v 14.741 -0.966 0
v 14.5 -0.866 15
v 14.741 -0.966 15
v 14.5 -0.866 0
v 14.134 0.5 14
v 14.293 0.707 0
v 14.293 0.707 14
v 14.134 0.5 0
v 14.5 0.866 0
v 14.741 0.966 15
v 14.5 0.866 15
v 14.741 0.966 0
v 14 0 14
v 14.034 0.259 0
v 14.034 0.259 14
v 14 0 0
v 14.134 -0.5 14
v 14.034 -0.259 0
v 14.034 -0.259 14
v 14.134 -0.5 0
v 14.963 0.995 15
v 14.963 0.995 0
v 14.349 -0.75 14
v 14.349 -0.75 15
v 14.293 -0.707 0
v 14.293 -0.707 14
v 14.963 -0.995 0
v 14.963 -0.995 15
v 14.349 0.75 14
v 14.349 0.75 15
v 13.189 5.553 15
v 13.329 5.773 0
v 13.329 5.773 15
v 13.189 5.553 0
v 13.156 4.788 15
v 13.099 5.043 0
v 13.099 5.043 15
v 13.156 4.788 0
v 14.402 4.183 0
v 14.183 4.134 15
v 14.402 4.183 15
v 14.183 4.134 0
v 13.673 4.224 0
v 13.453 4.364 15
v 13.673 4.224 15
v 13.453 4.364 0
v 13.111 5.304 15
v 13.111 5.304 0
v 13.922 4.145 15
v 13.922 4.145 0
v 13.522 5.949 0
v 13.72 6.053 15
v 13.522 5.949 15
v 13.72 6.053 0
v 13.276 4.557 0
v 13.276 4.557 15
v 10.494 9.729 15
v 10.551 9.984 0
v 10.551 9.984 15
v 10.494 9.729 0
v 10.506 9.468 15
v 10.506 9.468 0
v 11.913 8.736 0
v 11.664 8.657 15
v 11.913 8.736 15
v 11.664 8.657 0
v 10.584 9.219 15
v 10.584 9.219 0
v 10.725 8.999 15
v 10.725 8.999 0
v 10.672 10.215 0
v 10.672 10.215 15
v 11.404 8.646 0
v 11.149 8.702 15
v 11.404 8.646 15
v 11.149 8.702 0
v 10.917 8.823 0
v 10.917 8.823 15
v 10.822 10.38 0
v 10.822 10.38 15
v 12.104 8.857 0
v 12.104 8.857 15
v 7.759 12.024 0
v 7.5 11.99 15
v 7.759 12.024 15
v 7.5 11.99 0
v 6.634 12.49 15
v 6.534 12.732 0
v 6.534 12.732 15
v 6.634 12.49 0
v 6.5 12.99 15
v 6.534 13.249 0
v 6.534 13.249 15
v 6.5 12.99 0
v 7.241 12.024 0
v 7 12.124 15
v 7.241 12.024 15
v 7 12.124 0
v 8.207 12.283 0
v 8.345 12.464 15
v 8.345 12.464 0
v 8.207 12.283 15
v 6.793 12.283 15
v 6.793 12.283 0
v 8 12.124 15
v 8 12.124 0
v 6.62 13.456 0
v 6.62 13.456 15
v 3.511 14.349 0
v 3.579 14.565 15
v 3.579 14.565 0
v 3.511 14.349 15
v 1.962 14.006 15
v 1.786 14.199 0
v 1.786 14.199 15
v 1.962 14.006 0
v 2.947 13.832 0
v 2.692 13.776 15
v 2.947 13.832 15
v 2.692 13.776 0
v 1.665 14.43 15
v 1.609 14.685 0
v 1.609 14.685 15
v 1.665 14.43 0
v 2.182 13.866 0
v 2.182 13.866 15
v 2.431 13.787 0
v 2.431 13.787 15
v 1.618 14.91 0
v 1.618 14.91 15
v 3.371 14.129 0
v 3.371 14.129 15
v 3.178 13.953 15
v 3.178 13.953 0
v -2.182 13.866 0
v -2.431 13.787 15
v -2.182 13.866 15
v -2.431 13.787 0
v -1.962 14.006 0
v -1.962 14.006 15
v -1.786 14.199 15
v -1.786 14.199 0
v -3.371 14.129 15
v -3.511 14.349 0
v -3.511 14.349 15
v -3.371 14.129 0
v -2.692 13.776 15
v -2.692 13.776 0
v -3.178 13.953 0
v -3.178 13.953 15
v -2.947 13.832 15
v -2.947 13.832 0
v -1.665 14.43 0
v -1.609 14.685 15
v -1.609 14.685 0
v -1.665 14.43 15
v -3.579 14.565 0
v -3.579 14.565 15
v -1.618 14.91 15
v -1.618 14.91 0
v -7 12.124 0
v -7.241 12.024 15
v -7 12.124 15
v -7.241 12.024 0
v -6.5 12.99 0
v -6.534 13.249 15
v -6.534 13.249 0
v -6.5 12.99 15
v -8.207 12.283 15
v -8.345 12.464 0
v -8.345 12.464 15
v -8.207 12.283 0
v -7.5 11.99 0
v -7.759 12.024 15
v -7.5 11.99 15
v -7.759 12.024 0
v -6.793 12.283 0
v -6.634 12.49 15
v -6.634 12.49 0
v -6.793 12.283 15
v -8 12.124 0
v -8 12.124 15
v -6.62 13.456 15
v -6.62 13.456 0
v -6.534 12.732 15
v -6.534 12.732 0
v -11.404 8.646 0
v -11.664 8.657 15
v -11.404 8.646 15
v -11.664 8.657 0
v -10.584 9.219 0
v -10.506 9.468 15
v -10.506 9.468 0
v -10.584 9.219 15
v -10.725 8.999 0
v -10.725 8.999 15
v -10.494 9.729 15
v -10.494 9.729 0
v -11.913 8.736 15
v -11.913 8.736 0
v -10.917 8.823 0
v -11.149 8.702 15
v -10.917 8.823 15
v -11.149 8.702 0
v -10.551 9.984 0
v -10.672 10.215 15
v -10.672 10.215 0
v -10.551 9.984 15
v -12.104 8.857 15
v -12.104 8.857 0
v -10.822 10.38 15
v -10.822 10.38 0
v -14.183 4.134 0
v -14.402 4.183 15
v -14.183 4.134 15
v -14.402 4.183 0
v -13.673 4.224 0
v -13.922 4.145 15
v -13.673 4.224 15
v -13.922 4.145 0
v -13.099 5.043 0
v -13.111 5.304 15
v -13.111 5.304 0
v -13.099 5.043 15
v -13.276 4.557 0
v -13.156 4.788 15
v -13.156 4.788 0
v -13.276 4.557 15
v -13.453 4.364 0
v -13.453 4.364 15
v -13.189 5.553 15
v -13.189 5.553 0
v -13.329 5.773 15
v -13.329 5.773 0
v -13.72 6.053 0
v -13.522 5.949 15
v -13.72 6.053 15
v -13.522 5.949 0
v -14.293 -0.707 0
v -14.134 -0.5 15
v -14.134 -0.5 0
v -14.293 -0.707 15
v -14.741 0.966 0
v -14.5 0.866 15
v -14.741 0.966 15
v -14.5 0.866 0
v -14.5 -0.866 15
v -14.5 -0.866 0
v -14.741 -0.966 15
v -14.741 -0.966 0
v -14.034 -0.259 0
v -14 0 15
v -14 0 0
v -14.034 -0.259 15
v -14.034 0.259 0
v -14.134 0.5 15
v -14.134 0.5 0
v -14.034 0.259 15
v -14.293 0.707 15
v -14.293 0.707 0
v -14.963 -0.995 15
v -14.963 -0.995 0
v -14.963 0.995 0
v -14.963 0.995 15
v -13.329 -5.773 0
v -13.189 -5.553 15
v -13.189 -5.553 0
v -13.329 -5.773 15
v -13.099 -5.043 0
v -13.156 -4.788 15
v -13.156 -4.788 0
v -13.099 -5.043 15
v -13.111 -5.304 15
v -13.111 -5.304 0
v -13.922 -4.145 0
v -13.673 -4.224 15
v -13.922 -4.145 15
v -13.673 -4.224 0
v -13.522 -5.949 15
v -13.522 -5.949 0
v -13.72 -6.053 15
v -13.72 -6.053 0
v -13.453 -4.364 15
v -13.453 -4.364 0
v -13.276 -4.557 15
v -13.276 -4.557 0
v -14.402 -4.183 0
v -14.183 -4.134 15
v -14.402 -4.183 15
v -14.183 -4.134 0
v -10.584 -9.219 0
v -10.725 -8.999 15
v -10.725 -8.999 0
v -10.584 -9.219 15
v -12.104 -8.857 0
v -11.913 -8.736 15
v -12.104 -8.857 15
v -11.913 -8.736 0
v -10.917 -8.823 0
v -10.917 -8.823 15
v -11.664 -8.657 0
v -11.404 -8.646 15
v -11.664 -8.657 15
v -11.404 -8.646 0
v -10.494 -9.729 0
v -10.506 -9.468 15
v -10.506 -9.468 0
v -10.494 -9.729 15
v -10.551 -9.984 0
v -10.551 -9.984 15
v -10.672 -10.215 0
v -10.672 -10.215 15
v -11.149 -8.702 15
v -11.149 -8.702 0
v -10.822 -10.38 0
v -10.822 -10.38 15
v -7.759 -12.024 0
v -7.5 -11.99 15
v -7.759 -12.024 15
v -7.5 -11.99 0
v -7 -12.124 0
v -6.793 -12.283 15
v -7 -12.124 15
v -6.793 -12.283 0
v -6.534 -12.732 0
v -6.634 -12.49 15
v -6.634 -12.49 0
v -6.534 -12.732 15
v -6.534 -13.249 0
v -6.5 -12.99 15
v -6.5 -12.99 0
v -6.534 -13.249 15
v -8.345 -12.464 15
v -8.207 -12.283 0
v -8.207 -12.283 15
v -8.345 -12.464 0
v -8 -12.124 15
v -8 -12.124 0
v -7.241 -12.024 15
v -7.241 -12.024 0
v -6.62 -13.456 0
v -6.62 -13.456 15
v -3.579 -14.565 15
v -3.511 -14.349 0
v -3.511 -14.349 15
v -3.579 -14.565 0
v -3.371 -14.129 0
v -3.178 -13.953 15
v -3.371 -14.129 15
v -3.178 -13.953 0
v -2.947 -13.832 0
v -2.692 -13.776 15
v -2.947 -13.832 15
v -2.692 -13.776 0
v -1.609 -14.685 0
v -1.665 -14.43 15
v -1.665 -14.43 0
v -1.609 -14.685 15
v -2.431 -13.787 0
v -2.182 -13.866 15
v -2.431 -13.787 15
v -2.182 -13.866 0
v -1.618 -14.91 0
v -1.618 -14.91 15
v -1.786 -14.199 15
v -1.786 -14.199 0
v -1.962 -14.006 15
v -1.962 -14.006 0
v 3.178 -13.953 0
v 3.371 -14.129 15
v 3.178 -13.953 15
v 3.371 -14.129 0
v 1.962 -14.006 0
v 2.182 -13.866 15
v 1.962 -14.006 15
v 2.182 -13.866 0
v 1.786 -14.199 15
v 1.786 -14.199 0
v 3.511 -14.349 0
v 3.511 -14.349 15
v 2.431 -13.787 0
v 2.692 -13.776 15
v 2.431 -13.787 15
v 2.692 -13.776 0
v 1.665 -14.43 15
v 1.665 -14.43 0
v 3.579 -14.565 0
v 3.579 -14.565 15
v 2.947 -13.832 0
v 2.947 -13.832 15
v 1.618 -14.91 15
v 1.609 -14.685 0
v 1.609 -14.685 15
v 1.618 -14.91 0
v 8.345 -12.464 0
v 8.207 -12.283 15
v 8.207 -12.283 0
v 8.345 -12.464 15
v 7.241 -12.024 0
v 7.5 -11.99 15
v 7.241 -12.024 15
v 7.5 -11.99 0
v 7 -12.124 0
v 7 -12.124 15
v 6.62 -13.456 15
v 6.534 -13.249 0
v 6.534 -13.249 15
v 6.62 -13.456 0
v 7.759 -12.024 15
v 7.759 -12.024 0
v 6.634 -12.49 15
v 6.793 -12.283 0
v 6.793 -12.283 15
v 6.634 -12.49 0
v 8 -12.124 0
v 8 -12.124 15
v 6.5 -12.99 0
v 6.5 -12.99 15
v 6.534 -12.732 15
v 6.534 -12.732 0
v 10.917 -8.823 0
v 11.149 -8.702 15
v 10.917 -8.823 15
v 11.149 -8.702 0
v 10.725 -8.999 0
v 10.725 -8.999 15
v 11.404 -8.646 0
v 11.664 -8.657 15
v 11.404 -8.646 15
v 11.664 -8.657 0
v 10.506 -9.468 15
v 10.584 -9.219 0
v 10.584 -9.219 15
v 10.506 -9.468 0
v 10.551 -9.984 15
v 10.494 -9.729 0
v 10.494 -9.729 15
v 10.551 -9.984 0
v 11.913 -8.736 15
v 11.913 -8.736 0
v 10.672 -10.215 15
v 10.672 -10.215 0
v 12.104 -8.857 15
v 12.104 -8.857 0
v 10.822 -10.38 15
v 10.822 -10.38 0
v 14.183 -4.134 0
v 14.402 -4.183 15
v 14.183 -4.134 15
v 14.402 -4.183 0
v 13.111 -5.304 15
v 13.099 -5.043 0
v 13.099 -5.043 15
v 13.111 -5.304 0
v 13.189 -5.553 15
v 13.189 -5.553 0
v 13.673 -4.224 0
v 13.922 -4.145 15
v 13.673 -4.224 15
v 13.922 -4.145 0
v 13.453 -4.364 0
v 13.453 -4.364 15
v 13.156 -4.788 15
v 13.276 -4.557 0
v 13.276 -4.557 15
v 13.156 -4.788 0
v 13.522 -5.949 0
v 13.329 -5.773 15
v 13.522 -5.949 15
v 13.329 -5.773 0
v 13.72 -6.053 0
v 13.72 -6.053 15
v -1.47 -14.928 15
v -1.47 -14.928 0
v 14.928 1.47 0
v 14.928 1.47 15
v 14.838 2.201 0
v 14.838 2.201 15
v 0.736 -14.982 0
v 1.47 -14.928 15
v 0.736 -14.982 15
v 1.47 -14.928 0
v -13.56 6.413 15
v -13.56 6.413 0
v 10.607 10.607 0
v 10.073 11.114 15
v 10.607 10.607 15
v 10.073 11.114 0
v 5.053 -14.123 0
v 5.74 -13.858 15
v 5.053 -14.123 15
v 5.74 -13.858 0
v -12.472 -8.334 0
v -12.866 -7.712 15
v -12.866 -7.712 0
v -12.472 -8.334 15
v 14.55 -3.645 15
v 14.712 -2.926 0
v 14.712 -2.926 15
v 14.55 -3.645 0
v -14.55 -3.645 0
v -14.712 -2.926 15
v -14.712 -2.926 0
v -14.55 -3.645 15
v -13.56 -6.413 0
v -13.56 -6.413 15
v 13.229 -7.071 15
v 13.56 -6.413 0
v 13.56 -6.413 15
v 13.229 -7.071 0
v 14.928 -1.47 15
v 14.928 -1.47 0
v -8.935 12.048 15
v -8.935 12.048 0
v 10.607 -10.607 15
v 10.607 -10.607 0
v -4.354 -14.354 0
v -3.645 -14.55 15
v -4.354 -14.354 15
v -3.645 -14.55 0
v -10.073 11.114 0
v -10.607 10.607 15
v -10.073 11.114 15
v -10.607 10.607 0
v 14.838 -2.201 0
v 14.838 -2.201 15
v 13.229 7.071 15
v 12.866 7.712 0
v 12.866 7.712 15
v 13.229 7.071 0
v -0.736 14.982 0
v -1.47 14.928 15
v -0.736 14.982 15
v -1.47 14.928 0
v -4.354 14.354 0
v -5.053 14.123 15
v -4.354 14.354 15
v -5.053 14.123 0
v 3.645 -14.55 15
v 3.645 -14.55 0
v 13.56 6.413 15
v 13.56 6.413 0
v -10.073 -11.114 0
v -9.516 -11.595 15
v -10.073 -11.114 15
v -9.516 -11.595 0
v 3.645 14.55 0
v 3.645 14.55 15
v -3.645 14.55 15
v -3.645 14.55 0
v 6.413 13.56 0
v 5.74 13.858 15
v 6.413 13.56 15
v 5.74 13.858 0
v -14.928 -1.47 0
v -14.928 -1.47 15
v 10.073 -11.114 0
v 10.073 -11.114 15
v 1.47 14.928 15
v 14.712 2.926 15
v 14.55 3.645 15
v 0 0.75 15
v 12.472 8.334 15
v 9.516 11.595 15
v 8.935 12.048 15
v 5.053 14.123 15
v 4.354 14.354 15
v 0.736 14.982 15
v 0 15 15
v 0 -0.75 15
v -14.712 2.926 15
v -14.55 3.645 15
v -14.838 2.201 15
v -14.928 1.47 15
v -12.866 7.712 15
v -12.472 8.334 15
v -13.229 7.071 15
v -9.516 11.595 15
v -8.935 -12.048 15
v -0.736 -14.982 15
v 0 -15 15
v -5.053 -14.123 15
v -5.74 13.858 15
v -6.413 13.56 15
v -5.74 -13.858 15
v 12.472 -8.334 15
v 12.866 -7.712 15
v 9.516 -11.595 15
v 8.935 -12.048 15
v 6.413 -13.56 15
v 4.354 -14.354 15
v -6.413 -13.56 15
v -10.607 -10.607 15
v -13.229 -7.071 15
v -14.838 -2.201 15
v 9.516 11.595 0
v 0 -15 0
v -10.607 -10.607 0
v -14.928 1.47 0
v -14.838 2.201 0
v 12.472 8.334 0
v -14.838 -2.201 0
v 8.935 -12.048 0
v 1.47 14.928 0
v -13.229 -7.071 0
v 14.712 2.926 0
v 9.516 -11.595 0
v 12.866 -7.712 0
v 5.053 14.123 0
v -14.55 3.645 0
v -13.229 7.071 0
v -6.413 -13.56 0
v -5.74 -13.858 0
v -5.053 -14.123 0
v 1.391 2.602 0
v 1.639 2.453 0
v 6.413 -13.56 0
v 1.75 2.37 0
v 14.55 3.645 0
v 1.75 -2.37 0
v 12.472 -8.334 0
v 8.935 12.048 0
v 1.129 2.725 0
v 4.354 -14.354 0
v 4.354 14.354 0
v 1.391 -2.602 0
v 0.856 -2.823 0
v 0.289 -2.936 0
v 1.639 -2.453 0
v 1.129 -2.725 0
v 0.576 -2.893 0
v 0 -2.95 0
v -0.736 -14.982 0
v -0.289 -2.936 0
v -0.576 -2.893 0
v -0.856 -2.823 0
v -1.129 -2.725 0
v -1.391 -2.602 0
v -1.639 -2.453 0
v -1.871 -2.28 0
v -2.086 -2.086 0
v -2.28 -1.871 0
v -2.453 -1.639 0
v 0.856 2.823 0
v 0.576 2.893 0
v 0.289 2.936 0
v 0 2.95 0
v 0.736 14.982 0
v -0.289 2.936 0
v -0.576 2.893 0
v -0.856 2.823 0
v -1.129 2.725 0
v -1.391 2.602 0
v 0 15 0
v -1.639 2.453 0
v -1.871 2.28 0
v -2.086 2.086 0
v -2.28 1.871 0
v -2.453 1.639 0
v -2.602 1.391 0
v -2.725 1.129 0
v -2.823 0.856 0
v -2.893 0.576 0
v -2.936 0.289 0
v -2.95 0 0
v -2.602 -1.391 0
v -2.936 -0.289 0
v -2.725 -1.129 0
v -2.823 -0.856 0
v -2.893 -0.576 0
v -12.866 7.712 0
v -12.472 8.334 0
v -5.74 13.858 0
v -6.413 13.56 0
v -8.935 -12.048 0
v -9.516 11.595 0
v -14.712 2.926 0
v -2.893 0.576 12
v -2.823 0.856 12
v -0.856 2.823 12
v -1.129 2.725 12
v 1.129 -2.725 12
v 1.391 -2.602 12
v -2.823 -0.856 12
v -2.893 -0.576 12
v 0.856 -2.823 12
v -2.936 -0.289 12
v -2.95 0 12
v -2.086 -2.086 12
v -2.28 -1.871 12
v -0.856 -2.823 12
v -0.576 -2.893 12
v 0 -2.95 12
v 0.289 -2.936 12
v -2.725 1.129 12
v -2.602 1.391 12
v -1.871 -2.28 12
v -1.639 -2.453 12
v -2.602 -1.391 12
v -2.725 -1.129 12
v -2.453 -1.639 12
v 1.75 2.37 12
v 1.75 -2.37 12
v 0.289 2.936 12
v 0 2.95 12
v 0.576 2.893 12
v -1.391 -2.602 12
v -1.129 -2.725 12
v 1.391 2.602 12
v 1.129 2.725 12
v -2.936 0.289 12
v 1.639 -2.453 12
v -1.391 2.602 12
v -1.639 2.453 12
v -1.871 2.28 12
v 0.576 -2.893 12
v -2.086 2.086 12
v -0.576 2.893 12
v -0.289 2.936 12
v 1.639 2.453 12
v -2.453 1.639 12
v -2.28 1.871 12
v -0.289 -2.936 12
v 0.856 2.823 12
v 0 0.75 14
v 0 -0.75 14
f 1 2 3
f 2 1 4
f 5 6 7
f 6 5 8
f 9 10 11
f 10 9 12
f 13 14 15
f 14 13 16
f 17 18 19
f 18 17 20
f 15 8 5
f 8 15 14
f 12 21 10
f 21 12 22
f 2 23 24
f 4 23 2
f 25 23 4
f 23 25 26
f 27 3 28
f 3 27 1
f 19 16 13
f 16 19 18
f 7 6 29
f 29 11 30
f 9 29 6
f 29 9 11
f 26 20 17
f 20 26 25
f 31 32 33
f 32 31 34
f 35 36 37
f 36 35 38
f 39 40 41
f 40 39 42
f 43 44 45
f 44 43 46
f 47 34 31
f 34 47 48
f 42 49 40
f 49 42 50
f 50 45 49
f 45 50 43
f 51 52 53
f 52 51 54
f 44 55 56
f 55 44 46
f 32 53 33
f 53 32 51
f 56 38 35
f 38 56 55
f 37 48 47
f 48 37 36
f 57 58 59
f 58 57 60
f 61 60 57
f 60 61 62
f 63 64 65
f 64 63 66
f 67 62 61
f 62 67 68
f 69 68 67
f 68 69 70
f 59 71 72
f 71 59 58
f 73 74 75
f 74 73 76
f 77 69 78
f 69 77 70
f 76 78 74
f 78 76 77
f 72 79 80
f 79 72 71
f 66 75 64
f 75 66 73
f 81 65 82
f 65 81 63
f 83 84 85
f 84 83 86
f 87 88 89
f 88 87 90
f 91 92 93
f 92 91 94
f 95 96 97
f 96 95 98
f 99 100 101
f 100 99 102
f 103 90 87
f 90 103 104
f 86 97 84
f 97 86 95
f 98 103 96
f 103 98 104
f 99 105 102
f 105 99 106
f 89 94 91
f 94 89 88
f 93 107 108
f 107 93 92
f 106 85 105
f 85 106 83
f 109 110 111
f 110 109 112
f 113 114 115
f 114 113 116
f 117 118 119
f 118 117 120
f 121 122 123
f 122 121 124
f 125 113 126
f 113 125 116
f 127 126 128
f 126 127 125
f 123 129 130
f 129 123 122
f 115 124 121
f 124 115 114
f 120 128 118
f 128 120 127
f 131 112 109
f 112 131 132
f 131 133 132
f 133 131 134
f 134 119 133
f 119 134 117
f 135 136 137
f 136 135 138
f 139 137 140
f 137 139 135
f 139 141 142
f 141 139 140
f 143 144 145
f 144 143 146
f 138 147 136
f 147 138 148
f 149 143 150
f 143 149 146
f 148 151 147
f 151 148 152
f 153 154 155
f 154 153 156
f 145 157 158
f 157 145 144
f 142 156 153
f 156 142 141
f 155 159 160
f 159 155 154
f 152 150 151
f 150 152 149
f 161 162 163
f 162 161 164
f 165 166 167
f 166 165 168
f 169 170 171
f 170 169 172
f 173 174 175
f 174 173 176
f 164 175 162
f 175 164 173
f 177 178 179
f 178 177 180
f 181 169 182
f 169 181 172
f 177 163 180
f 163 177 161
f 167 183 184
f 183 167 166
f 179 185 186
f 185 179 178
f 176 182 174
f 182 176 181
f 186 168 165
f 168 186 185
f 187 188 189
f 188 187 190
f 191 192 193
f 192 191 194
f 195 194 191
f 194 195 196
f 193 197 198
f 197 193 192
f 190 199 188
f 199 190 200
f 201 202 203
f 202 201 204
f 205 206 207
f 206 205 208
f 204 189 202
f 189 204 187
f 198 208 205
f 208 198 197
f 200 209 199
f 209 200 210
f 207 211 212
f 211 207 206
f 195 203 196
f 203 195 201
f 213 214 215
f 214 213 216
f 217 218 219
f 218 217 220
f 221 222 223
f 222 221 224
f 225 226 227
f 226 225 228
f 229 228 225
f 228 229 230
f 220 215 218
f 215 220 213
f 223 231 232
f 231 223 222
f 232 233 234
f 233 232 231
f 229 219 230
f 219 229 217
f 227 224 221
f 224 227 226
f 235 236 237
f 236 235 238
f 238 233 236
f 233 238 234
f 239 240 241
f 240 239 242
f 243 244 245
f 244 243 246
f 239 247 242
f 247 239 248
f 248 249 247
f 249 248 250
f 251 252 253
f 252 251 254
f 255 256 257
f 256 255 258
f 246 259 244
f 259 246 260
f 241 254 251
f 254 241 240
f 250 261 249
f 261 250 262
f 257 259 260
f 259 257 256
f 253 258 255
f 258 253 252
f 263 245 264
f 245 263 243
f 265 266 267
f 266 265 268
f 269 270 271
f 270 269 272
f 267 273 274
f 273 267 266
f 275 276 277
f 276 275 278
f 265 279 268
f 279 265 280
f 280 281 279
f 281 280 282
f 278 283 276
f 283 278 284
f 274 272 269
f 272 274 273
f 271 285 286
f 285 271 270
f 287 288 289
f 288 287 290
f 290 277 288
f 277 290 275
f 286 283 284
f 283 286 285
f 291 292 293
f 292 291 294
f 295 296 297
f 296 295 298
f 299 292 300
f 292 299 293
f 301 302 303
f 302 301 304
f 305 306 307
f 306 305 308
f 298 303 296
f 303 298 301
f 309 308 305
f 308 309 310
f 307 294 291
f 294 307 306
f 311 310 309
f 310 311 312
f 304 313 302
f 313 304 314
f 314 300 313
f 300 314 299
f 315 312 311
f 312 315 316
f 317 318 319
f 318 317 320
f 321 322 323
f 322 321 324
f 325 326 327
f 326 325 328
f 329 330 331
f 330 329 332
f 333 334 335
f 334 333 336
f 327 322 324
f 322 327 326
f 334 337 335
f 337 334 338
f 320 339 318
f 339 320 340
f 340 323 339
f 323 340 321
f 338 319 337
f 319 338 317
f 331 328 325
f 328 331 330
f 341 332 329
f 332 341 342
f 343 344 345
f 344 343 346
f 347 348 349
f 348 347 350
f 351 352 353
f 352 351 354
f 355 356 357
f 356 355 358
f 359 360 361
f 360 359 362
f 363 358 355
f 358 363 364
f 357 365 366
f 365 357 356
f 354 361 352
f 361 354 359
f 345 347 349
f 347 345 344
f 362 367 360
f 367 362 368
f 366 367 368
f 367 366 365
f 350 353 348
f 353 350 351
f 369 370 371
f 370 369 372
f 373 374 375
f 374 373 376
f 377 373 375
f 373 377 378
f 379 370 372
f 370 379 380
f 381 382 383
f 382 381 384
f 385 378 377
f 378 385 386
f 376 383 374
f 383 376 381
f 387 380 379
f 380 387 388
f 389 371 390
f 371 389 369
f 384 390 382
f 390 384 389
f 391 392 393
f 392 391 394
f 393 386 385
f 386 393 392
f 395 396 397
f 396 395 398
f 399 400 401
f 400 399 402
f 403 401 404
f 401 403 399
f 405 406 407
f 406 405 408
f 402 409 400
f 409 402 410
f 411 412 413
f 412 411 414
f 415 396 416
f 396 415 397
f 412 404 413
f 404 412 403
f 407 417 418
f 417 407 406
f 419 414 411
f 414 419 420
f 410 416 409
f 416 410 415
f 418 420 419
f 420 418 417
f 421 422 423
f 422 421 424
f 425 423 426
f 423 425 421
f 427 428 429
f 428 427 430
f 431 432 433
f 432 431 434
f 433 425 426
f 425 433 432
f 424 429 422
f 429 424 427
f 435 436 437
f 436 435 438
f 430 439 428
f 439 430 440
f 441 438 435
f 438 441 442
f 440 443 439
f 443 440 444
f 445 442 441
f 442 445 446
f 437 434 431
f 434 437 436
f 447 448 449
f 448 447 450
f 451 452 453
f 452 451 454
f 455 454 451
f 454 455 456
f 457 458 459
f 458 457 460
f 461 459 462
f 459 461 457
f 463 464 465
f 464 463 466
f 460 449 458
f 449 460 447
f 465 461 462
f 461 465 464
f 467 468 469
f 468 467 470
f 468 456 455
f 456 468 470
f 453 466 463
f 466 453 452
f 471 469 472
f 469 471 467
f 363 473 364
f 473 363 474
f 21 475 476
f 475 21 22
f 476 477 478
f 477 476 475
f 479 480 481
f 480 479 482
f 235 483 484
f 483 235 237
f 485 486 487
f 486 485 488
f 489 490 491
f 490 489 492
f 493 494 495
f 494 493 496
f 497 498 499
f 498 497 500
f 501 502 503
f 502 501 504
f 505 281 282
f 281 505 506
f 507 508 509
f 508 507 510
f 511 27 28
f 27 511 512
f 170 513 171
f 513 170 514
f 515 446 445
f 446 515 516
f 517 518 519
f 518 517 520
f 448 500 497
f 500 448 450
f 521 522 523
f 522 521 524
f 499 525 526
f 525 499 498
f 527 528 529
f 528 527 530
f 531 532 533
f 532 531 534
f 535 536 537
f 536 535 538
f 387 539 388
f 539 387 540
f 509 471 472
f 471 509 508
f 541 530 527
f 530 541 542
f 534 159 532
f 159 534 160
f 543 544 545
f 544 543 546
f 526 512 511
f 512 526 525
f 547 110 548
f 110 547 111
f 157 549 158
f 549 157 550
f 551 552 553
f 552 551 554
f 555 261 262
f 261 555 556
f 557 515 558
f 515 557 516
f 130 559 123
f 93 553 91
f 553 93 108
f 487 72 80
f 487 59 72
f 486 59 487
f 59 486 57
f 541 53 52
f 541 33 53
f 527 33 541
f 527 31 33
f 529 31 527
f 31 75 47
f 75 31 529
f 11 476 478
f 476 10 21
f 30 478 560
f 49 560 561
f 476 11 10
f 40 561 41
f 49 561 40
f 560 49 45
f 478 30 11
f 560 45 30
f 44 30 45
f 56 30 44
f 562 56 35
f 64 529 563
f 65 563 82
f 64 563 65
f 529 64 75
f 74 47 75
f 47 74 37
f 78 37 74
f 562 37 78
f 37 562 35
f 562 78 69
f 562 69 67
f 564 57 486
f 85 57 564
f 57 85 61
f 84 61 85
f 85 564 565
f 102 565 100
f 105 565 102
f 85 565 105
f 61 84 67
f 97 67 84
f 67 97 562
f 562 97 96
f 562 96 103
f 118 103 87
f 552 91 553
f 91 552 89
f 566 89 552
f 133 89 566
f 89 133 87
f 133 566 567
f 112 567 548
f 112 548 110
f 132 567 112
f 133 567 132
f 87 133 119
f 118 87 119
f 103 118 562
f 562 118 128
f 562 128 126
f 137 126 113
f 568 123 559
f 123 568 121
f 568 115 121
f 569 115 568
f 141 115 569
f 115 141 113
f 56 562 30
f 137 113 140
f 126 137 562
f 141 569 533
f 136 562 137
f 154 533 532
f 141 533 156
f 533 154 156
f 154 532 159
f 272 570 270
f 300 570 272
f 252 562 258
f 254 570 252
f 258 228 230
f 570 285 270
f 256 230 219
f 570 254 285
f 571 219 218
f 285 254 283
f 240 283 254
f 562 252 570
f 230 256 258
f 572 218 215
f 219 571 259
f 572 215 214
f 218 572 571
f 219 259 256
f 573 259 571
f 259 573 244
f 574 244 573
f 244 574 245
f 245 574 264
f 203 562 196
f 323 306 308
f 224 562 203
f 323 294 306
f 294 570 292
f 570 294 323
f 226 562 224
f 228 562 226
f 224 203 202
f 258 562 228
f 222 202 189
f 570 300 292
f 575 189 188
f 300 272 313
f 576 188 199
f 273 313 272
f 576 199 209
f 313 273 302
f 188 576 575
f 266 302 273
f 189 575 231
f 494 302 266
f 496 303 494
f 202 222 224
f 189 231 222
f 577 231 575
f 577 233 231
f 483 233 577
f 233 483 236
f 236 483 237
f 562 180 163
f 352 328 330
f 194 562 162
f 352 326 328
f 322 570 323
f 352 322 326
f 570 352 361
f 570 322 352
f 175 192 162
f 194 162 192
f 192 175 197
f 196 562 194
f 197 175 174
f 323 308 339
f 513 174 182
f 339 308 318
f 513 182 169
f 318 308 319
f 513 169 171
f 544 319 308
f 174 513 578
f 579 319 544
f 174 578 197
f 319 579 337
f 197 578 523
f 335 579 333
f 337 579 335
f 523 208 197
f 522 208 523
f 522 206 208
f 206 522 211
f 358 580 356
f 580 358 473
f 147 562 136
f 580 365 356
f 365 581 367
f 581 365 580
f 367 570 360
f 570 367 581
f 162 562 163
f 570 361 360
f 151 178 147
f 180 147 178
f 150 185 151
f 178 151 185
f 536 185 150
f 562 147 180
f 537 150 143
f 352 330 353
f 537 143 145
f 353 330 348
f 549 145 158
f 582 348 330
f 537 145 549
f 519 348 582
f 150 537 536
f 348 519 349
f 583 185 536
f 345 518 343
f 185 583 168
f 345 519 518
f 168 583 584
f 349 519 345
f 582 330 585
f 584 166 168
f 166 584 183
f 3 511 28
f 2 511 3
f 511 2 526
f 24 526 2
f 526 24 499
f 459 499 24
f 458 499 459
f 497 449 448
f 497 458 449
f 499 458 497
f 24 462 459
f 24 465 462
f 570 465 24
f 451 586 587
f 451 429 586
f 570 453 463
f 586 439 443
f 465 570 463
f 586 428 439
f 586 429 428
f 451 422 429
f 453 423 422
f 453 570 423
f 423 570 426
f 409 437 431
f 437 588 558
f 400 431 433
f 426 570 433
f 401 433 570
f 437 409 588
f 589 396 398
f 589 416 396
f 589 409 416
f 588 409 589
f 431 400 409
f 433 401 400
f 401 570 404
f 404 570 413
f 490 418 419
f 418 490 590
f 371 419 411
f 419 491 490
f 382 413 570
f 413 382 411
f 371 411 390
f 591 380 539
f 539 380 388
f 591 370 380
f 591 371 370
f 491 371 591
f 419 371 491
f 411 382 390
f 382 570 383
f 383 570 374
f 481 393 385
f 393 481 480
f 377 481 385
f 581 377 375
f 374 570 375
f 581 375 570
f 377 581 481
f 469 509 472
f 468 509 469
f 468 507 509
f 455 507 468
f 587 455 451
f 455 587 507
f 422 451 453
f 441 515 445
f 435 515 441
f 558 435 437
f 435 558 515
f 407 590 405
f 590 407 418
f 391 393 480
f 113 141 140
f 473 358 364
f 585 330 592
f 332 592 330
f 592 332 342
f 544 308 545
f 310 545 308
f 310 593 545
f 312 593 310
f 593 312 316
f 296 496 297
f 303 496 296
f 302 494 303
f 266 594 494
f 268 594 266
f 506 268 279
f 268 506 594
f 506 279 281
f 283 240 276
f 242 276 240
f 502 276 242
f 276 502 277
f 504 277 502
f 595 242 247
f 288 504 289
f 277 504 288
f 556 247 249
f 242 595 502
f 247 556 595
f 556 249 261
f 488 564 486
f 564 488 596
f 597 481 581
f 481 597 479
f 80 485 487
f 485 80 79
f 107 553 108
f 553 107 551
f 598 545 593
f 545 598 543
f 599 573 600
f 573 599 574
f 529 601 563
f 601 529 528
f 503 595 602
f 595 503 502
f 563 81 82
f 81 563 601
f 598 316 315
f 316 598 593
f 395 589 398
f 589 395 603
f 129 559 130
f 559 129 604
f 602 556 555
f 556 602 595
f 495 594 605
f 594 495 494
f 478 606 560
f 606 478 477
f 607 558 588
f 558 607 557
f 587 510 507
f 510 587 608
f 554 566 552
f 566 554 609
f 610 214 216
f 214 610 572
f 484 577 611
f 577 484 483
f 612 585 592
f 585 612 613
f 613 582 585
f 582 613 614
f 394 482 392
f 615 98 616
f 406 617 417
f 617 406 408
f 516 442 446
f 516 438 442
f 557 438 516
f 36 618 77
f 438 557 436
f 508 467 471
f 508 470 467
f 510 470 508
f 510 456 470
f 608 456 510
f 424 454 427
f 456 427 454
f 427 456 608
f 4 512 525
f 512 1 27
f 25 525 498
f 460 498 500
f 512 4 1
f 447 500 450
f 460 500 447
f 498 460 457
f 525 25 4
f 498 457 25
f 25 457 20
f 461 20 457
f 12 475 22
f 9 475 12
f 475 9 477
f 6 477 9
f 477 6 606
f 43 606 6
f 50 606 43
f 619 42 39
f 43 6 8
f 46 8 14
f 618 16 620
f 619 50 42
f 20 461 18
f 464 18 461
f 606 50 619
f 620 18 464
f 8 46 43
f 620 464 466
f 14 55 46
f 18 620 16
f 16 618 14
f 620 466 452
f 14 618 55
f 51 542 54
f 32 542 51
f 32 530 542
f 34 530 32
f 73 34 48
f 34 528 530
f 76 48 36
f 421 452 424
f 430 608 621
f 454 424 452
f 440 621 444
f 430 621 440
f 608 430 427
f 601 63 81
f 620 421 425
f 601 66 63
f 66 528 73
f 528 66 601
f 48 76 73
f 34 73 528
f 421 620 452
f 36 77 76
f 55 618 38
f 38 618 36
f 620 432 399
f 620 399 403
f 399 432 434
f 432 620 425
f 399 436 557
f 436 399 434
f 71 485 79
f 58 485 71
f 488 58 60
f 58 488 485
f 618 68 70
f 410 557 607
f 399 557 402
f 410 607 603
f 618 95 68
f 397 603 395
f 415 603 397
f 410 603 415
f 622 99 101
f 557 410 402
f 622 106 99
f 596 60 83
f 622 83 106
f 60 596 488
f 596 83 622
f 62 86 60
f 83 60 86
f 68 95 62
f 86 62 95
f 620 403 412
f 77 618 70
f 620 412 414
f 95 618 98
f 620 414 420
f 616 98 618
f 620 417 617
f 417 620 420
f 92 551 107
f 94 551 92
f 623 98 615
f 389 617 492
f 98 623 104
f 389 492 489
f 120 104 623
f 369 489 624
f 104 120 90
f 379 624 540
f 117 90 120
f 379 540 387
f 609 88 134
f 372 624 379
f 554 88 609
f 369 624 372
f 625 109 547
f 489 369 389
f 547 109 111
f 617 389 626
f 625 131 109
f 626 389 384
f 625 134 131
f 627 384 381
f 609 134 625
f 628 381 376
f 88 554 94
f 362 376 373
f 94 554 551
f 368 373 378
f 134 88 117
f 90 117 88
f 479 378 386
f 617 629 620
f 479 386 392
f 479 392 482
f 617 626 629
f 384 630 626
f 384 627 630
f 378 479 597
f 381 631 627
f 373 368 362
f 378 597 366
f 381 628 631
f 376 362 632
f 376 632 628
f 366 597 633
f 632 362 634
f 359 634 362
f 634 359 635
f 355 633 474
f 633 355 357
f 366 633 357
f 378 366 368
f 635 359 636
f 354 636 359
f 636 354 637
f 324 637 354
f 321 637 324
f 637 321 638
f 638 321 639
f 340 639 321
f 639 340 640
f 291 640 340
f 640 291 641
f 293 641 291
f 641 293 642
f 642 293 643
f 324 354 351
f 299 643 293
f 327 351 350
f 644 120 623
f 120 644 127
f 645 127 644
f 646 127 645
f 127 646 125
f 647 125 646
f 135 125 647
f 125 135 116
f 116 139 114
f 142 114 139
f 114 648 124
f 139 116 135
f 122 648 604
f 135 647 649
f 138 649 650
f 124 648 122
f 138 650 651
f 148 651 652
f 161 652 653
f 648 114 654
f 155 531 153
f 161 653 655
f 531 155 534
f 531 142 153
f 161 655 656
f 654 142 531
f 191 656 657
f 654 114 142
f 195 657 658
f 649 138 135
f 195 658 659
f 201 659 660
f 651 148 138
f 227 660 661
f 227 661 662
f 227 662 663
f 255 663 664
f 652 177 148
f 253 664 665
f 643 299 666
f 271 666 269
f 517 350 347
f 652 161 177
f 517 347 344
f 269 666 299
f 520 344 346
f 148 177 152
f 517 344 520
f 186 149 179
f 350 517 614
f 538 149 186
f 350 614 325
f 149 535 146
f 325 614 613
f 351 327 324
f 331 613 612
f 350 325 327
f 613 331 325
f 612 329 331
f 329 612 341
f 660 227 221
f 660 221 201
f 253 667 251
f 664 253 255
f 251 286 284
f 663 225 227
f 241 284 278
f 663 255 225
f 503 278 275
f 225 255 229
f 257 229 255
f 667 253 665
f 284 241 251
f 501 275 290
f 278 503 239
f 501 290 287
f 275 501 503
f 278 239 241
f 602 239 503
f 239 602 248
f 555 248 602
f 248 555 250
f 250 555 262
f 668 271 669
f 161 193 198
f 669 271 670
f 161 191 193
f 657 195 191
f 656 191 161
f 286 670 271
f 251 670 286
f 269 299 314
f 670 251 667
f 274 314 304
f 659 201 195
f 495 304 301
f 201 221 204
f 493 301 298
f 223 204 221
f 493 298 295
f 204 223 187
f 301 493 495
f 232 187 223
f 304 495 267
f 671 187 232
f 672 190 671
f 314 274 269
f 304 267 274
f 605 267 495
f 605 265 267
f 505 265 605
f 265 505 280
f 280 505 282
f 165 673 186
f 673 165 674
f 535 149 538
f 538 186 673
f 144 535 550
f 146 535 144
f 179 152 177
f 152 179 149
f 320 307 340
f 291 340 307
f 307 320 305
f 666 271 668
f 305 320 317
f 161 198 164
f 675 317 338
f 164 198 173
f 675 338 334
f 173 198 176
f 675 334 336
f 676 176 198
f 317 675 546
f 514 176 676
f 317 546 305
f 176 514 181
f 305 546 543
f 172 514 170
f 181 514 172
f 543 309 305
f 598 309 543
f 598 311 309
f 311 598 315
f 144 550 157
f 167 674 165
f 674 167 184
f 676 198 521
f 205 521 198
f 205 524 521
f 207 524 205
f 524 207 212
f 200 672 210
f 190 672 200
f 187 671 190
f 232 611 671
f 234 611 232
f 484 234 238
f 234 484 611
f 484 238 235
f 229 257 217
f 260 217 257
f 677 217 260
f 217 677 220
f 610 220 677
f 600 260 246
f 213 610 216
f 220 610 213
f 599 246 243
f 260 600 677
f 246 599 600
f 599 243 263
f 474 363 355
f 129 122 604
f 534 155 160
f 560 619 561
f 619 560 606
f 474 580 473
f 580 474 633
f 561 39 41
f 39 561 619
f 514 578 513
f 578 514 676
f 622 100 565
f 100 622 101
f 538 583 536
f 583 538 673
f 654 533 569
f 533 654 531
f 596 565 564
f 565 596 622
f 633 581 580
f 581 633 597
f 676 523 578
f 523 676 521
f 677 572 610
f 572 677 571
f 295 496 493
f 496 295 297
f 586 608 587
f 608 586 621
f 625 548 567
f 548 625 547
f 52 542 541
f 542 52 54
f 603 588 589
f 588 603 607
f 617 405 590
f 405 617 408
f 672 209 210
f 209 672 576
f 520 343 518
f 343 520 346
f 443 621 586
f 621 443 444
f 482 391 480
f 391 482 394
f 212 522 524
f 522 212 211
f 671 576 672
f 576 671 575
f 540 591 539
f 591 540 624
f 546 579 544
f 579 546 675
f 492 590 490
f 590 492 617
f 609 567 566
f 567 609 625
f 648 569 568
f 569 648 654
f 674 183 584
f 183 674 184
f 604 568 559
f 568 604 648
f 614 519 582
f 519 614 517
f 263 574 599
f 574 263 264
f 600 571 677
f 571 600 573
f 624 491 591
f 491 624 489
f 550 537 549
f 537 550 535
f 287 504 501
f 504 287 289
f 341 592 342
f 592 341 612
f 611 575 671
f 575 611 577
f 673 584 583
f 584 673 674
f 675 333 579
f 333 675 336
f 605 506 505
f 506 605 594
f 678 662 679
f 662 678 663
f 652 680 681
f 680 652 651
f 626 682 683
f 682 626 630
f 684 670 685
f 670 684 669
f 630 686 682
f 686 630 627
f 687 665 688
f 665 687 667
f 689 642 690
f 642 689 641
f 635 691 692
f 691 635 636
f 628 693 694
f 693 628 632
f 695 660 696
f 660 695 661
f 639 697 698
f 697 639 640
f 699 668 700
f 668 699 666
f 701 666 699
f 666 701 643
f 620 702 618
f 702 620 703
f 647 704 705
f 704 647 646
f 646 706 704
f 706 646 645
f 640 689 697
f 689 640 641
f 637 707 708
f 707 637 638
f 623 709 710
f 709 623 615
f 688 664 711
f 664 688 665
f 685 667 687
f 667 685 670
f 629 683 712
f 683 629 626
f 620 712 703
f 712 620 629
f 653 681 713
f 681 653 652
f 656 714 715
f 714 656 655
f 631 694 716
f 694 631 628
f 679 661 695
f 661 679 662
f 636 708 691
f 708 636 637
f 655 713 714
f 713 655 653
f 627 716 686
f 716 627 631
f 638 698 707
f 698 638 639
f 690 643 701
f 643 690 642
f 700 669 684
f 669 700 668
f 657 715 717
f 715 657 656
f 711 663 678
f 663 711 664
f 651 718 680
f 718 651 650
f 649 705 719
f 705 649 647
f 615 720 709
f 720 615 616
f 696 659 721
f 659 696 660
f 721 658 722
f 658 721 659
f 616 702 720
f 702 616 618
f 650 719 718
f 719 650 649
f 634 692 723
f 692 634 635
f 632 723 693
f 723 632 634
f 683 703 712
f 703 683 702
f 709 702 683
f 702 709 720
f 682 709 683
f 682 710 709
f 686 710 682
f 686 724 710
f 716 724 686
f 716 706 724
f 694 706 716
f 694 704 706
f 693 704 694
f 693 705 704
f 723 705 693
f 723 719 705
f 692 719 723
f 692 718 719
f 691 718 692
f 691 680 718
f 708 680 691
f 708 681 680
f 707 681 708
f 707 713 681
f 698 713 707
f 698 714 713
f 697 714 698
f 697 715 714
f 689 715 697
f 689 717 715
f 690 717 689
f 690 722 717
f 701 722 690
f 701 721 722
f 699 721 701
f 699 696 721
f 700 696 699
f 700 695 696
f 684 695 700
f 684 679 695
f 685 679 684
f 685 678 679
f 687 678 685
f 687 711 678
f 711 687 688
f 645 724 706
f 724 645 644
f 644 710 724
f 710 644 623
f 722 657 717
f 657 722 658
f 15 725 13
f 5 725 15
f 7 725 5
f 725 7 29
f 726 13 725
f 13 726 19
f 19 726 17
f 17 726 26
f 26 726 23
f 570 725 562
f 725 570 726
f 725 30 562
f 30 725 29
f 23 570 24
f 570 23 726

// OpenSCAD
// Replacement knob for a 6 mm D-shaft (hotplates, stirrers, power supplies)
// Category: quick fixes. D-shaped blind bore from the bottom, grip grooves and a
// pointer groove on top that lines up with the flat of the shaft.
// Print: PETG (heat near hotplates), 0.15 mm layers, 4 perimeters, bore face down.
// SPDX-License-Identifier: CERN-OHL-P-2.0

/* [Knob] */
knob_d = 30;
knob_h = 15;
shaft_d = 5.9;         // 6 mm shaft + 0.2 mm clearance
shaft_flat = 4.7;      // flat-to-round distance (4.5 mm nominal + clearance)
bore_depth = 12;
n_grooves = 18;
groove_d = 2;
pointer_w = 1.5;
pointer_depth = 1;

/* [Hidden] */
eps = 0.01;

difference() {
    cylinder(d = knob_d, h = knob_h, $fn = 128);
    // D-shaped bore; the flat faces +X
    translate([0, 0, -eps])
        linear_extrude(bore_depth + eps)
            intersection() {
                circle(d = shaft_d, $fn = 64);
                translate([-shaft_d / 2, -shaft_d / 2]) square([shaft_flat, shaft_d]);
            }
    // grip grooves
    for (i = [0 : n_grooves - 1])
        rotate(i * 360 / n_grooves)
            translate([knob_d / 2, 0, -eps]) cylinder(d = groove_d, h = knob_h + 2 * eps, $fn = 24);
    // pointer groove on top, pointing at the flat (+X)
    translate([0, -pointer_w / 2, knob_h - pointer_depth])
        cube([knob_d / 2 + 1, pointer_w, pointer_depth + eps]);
}
